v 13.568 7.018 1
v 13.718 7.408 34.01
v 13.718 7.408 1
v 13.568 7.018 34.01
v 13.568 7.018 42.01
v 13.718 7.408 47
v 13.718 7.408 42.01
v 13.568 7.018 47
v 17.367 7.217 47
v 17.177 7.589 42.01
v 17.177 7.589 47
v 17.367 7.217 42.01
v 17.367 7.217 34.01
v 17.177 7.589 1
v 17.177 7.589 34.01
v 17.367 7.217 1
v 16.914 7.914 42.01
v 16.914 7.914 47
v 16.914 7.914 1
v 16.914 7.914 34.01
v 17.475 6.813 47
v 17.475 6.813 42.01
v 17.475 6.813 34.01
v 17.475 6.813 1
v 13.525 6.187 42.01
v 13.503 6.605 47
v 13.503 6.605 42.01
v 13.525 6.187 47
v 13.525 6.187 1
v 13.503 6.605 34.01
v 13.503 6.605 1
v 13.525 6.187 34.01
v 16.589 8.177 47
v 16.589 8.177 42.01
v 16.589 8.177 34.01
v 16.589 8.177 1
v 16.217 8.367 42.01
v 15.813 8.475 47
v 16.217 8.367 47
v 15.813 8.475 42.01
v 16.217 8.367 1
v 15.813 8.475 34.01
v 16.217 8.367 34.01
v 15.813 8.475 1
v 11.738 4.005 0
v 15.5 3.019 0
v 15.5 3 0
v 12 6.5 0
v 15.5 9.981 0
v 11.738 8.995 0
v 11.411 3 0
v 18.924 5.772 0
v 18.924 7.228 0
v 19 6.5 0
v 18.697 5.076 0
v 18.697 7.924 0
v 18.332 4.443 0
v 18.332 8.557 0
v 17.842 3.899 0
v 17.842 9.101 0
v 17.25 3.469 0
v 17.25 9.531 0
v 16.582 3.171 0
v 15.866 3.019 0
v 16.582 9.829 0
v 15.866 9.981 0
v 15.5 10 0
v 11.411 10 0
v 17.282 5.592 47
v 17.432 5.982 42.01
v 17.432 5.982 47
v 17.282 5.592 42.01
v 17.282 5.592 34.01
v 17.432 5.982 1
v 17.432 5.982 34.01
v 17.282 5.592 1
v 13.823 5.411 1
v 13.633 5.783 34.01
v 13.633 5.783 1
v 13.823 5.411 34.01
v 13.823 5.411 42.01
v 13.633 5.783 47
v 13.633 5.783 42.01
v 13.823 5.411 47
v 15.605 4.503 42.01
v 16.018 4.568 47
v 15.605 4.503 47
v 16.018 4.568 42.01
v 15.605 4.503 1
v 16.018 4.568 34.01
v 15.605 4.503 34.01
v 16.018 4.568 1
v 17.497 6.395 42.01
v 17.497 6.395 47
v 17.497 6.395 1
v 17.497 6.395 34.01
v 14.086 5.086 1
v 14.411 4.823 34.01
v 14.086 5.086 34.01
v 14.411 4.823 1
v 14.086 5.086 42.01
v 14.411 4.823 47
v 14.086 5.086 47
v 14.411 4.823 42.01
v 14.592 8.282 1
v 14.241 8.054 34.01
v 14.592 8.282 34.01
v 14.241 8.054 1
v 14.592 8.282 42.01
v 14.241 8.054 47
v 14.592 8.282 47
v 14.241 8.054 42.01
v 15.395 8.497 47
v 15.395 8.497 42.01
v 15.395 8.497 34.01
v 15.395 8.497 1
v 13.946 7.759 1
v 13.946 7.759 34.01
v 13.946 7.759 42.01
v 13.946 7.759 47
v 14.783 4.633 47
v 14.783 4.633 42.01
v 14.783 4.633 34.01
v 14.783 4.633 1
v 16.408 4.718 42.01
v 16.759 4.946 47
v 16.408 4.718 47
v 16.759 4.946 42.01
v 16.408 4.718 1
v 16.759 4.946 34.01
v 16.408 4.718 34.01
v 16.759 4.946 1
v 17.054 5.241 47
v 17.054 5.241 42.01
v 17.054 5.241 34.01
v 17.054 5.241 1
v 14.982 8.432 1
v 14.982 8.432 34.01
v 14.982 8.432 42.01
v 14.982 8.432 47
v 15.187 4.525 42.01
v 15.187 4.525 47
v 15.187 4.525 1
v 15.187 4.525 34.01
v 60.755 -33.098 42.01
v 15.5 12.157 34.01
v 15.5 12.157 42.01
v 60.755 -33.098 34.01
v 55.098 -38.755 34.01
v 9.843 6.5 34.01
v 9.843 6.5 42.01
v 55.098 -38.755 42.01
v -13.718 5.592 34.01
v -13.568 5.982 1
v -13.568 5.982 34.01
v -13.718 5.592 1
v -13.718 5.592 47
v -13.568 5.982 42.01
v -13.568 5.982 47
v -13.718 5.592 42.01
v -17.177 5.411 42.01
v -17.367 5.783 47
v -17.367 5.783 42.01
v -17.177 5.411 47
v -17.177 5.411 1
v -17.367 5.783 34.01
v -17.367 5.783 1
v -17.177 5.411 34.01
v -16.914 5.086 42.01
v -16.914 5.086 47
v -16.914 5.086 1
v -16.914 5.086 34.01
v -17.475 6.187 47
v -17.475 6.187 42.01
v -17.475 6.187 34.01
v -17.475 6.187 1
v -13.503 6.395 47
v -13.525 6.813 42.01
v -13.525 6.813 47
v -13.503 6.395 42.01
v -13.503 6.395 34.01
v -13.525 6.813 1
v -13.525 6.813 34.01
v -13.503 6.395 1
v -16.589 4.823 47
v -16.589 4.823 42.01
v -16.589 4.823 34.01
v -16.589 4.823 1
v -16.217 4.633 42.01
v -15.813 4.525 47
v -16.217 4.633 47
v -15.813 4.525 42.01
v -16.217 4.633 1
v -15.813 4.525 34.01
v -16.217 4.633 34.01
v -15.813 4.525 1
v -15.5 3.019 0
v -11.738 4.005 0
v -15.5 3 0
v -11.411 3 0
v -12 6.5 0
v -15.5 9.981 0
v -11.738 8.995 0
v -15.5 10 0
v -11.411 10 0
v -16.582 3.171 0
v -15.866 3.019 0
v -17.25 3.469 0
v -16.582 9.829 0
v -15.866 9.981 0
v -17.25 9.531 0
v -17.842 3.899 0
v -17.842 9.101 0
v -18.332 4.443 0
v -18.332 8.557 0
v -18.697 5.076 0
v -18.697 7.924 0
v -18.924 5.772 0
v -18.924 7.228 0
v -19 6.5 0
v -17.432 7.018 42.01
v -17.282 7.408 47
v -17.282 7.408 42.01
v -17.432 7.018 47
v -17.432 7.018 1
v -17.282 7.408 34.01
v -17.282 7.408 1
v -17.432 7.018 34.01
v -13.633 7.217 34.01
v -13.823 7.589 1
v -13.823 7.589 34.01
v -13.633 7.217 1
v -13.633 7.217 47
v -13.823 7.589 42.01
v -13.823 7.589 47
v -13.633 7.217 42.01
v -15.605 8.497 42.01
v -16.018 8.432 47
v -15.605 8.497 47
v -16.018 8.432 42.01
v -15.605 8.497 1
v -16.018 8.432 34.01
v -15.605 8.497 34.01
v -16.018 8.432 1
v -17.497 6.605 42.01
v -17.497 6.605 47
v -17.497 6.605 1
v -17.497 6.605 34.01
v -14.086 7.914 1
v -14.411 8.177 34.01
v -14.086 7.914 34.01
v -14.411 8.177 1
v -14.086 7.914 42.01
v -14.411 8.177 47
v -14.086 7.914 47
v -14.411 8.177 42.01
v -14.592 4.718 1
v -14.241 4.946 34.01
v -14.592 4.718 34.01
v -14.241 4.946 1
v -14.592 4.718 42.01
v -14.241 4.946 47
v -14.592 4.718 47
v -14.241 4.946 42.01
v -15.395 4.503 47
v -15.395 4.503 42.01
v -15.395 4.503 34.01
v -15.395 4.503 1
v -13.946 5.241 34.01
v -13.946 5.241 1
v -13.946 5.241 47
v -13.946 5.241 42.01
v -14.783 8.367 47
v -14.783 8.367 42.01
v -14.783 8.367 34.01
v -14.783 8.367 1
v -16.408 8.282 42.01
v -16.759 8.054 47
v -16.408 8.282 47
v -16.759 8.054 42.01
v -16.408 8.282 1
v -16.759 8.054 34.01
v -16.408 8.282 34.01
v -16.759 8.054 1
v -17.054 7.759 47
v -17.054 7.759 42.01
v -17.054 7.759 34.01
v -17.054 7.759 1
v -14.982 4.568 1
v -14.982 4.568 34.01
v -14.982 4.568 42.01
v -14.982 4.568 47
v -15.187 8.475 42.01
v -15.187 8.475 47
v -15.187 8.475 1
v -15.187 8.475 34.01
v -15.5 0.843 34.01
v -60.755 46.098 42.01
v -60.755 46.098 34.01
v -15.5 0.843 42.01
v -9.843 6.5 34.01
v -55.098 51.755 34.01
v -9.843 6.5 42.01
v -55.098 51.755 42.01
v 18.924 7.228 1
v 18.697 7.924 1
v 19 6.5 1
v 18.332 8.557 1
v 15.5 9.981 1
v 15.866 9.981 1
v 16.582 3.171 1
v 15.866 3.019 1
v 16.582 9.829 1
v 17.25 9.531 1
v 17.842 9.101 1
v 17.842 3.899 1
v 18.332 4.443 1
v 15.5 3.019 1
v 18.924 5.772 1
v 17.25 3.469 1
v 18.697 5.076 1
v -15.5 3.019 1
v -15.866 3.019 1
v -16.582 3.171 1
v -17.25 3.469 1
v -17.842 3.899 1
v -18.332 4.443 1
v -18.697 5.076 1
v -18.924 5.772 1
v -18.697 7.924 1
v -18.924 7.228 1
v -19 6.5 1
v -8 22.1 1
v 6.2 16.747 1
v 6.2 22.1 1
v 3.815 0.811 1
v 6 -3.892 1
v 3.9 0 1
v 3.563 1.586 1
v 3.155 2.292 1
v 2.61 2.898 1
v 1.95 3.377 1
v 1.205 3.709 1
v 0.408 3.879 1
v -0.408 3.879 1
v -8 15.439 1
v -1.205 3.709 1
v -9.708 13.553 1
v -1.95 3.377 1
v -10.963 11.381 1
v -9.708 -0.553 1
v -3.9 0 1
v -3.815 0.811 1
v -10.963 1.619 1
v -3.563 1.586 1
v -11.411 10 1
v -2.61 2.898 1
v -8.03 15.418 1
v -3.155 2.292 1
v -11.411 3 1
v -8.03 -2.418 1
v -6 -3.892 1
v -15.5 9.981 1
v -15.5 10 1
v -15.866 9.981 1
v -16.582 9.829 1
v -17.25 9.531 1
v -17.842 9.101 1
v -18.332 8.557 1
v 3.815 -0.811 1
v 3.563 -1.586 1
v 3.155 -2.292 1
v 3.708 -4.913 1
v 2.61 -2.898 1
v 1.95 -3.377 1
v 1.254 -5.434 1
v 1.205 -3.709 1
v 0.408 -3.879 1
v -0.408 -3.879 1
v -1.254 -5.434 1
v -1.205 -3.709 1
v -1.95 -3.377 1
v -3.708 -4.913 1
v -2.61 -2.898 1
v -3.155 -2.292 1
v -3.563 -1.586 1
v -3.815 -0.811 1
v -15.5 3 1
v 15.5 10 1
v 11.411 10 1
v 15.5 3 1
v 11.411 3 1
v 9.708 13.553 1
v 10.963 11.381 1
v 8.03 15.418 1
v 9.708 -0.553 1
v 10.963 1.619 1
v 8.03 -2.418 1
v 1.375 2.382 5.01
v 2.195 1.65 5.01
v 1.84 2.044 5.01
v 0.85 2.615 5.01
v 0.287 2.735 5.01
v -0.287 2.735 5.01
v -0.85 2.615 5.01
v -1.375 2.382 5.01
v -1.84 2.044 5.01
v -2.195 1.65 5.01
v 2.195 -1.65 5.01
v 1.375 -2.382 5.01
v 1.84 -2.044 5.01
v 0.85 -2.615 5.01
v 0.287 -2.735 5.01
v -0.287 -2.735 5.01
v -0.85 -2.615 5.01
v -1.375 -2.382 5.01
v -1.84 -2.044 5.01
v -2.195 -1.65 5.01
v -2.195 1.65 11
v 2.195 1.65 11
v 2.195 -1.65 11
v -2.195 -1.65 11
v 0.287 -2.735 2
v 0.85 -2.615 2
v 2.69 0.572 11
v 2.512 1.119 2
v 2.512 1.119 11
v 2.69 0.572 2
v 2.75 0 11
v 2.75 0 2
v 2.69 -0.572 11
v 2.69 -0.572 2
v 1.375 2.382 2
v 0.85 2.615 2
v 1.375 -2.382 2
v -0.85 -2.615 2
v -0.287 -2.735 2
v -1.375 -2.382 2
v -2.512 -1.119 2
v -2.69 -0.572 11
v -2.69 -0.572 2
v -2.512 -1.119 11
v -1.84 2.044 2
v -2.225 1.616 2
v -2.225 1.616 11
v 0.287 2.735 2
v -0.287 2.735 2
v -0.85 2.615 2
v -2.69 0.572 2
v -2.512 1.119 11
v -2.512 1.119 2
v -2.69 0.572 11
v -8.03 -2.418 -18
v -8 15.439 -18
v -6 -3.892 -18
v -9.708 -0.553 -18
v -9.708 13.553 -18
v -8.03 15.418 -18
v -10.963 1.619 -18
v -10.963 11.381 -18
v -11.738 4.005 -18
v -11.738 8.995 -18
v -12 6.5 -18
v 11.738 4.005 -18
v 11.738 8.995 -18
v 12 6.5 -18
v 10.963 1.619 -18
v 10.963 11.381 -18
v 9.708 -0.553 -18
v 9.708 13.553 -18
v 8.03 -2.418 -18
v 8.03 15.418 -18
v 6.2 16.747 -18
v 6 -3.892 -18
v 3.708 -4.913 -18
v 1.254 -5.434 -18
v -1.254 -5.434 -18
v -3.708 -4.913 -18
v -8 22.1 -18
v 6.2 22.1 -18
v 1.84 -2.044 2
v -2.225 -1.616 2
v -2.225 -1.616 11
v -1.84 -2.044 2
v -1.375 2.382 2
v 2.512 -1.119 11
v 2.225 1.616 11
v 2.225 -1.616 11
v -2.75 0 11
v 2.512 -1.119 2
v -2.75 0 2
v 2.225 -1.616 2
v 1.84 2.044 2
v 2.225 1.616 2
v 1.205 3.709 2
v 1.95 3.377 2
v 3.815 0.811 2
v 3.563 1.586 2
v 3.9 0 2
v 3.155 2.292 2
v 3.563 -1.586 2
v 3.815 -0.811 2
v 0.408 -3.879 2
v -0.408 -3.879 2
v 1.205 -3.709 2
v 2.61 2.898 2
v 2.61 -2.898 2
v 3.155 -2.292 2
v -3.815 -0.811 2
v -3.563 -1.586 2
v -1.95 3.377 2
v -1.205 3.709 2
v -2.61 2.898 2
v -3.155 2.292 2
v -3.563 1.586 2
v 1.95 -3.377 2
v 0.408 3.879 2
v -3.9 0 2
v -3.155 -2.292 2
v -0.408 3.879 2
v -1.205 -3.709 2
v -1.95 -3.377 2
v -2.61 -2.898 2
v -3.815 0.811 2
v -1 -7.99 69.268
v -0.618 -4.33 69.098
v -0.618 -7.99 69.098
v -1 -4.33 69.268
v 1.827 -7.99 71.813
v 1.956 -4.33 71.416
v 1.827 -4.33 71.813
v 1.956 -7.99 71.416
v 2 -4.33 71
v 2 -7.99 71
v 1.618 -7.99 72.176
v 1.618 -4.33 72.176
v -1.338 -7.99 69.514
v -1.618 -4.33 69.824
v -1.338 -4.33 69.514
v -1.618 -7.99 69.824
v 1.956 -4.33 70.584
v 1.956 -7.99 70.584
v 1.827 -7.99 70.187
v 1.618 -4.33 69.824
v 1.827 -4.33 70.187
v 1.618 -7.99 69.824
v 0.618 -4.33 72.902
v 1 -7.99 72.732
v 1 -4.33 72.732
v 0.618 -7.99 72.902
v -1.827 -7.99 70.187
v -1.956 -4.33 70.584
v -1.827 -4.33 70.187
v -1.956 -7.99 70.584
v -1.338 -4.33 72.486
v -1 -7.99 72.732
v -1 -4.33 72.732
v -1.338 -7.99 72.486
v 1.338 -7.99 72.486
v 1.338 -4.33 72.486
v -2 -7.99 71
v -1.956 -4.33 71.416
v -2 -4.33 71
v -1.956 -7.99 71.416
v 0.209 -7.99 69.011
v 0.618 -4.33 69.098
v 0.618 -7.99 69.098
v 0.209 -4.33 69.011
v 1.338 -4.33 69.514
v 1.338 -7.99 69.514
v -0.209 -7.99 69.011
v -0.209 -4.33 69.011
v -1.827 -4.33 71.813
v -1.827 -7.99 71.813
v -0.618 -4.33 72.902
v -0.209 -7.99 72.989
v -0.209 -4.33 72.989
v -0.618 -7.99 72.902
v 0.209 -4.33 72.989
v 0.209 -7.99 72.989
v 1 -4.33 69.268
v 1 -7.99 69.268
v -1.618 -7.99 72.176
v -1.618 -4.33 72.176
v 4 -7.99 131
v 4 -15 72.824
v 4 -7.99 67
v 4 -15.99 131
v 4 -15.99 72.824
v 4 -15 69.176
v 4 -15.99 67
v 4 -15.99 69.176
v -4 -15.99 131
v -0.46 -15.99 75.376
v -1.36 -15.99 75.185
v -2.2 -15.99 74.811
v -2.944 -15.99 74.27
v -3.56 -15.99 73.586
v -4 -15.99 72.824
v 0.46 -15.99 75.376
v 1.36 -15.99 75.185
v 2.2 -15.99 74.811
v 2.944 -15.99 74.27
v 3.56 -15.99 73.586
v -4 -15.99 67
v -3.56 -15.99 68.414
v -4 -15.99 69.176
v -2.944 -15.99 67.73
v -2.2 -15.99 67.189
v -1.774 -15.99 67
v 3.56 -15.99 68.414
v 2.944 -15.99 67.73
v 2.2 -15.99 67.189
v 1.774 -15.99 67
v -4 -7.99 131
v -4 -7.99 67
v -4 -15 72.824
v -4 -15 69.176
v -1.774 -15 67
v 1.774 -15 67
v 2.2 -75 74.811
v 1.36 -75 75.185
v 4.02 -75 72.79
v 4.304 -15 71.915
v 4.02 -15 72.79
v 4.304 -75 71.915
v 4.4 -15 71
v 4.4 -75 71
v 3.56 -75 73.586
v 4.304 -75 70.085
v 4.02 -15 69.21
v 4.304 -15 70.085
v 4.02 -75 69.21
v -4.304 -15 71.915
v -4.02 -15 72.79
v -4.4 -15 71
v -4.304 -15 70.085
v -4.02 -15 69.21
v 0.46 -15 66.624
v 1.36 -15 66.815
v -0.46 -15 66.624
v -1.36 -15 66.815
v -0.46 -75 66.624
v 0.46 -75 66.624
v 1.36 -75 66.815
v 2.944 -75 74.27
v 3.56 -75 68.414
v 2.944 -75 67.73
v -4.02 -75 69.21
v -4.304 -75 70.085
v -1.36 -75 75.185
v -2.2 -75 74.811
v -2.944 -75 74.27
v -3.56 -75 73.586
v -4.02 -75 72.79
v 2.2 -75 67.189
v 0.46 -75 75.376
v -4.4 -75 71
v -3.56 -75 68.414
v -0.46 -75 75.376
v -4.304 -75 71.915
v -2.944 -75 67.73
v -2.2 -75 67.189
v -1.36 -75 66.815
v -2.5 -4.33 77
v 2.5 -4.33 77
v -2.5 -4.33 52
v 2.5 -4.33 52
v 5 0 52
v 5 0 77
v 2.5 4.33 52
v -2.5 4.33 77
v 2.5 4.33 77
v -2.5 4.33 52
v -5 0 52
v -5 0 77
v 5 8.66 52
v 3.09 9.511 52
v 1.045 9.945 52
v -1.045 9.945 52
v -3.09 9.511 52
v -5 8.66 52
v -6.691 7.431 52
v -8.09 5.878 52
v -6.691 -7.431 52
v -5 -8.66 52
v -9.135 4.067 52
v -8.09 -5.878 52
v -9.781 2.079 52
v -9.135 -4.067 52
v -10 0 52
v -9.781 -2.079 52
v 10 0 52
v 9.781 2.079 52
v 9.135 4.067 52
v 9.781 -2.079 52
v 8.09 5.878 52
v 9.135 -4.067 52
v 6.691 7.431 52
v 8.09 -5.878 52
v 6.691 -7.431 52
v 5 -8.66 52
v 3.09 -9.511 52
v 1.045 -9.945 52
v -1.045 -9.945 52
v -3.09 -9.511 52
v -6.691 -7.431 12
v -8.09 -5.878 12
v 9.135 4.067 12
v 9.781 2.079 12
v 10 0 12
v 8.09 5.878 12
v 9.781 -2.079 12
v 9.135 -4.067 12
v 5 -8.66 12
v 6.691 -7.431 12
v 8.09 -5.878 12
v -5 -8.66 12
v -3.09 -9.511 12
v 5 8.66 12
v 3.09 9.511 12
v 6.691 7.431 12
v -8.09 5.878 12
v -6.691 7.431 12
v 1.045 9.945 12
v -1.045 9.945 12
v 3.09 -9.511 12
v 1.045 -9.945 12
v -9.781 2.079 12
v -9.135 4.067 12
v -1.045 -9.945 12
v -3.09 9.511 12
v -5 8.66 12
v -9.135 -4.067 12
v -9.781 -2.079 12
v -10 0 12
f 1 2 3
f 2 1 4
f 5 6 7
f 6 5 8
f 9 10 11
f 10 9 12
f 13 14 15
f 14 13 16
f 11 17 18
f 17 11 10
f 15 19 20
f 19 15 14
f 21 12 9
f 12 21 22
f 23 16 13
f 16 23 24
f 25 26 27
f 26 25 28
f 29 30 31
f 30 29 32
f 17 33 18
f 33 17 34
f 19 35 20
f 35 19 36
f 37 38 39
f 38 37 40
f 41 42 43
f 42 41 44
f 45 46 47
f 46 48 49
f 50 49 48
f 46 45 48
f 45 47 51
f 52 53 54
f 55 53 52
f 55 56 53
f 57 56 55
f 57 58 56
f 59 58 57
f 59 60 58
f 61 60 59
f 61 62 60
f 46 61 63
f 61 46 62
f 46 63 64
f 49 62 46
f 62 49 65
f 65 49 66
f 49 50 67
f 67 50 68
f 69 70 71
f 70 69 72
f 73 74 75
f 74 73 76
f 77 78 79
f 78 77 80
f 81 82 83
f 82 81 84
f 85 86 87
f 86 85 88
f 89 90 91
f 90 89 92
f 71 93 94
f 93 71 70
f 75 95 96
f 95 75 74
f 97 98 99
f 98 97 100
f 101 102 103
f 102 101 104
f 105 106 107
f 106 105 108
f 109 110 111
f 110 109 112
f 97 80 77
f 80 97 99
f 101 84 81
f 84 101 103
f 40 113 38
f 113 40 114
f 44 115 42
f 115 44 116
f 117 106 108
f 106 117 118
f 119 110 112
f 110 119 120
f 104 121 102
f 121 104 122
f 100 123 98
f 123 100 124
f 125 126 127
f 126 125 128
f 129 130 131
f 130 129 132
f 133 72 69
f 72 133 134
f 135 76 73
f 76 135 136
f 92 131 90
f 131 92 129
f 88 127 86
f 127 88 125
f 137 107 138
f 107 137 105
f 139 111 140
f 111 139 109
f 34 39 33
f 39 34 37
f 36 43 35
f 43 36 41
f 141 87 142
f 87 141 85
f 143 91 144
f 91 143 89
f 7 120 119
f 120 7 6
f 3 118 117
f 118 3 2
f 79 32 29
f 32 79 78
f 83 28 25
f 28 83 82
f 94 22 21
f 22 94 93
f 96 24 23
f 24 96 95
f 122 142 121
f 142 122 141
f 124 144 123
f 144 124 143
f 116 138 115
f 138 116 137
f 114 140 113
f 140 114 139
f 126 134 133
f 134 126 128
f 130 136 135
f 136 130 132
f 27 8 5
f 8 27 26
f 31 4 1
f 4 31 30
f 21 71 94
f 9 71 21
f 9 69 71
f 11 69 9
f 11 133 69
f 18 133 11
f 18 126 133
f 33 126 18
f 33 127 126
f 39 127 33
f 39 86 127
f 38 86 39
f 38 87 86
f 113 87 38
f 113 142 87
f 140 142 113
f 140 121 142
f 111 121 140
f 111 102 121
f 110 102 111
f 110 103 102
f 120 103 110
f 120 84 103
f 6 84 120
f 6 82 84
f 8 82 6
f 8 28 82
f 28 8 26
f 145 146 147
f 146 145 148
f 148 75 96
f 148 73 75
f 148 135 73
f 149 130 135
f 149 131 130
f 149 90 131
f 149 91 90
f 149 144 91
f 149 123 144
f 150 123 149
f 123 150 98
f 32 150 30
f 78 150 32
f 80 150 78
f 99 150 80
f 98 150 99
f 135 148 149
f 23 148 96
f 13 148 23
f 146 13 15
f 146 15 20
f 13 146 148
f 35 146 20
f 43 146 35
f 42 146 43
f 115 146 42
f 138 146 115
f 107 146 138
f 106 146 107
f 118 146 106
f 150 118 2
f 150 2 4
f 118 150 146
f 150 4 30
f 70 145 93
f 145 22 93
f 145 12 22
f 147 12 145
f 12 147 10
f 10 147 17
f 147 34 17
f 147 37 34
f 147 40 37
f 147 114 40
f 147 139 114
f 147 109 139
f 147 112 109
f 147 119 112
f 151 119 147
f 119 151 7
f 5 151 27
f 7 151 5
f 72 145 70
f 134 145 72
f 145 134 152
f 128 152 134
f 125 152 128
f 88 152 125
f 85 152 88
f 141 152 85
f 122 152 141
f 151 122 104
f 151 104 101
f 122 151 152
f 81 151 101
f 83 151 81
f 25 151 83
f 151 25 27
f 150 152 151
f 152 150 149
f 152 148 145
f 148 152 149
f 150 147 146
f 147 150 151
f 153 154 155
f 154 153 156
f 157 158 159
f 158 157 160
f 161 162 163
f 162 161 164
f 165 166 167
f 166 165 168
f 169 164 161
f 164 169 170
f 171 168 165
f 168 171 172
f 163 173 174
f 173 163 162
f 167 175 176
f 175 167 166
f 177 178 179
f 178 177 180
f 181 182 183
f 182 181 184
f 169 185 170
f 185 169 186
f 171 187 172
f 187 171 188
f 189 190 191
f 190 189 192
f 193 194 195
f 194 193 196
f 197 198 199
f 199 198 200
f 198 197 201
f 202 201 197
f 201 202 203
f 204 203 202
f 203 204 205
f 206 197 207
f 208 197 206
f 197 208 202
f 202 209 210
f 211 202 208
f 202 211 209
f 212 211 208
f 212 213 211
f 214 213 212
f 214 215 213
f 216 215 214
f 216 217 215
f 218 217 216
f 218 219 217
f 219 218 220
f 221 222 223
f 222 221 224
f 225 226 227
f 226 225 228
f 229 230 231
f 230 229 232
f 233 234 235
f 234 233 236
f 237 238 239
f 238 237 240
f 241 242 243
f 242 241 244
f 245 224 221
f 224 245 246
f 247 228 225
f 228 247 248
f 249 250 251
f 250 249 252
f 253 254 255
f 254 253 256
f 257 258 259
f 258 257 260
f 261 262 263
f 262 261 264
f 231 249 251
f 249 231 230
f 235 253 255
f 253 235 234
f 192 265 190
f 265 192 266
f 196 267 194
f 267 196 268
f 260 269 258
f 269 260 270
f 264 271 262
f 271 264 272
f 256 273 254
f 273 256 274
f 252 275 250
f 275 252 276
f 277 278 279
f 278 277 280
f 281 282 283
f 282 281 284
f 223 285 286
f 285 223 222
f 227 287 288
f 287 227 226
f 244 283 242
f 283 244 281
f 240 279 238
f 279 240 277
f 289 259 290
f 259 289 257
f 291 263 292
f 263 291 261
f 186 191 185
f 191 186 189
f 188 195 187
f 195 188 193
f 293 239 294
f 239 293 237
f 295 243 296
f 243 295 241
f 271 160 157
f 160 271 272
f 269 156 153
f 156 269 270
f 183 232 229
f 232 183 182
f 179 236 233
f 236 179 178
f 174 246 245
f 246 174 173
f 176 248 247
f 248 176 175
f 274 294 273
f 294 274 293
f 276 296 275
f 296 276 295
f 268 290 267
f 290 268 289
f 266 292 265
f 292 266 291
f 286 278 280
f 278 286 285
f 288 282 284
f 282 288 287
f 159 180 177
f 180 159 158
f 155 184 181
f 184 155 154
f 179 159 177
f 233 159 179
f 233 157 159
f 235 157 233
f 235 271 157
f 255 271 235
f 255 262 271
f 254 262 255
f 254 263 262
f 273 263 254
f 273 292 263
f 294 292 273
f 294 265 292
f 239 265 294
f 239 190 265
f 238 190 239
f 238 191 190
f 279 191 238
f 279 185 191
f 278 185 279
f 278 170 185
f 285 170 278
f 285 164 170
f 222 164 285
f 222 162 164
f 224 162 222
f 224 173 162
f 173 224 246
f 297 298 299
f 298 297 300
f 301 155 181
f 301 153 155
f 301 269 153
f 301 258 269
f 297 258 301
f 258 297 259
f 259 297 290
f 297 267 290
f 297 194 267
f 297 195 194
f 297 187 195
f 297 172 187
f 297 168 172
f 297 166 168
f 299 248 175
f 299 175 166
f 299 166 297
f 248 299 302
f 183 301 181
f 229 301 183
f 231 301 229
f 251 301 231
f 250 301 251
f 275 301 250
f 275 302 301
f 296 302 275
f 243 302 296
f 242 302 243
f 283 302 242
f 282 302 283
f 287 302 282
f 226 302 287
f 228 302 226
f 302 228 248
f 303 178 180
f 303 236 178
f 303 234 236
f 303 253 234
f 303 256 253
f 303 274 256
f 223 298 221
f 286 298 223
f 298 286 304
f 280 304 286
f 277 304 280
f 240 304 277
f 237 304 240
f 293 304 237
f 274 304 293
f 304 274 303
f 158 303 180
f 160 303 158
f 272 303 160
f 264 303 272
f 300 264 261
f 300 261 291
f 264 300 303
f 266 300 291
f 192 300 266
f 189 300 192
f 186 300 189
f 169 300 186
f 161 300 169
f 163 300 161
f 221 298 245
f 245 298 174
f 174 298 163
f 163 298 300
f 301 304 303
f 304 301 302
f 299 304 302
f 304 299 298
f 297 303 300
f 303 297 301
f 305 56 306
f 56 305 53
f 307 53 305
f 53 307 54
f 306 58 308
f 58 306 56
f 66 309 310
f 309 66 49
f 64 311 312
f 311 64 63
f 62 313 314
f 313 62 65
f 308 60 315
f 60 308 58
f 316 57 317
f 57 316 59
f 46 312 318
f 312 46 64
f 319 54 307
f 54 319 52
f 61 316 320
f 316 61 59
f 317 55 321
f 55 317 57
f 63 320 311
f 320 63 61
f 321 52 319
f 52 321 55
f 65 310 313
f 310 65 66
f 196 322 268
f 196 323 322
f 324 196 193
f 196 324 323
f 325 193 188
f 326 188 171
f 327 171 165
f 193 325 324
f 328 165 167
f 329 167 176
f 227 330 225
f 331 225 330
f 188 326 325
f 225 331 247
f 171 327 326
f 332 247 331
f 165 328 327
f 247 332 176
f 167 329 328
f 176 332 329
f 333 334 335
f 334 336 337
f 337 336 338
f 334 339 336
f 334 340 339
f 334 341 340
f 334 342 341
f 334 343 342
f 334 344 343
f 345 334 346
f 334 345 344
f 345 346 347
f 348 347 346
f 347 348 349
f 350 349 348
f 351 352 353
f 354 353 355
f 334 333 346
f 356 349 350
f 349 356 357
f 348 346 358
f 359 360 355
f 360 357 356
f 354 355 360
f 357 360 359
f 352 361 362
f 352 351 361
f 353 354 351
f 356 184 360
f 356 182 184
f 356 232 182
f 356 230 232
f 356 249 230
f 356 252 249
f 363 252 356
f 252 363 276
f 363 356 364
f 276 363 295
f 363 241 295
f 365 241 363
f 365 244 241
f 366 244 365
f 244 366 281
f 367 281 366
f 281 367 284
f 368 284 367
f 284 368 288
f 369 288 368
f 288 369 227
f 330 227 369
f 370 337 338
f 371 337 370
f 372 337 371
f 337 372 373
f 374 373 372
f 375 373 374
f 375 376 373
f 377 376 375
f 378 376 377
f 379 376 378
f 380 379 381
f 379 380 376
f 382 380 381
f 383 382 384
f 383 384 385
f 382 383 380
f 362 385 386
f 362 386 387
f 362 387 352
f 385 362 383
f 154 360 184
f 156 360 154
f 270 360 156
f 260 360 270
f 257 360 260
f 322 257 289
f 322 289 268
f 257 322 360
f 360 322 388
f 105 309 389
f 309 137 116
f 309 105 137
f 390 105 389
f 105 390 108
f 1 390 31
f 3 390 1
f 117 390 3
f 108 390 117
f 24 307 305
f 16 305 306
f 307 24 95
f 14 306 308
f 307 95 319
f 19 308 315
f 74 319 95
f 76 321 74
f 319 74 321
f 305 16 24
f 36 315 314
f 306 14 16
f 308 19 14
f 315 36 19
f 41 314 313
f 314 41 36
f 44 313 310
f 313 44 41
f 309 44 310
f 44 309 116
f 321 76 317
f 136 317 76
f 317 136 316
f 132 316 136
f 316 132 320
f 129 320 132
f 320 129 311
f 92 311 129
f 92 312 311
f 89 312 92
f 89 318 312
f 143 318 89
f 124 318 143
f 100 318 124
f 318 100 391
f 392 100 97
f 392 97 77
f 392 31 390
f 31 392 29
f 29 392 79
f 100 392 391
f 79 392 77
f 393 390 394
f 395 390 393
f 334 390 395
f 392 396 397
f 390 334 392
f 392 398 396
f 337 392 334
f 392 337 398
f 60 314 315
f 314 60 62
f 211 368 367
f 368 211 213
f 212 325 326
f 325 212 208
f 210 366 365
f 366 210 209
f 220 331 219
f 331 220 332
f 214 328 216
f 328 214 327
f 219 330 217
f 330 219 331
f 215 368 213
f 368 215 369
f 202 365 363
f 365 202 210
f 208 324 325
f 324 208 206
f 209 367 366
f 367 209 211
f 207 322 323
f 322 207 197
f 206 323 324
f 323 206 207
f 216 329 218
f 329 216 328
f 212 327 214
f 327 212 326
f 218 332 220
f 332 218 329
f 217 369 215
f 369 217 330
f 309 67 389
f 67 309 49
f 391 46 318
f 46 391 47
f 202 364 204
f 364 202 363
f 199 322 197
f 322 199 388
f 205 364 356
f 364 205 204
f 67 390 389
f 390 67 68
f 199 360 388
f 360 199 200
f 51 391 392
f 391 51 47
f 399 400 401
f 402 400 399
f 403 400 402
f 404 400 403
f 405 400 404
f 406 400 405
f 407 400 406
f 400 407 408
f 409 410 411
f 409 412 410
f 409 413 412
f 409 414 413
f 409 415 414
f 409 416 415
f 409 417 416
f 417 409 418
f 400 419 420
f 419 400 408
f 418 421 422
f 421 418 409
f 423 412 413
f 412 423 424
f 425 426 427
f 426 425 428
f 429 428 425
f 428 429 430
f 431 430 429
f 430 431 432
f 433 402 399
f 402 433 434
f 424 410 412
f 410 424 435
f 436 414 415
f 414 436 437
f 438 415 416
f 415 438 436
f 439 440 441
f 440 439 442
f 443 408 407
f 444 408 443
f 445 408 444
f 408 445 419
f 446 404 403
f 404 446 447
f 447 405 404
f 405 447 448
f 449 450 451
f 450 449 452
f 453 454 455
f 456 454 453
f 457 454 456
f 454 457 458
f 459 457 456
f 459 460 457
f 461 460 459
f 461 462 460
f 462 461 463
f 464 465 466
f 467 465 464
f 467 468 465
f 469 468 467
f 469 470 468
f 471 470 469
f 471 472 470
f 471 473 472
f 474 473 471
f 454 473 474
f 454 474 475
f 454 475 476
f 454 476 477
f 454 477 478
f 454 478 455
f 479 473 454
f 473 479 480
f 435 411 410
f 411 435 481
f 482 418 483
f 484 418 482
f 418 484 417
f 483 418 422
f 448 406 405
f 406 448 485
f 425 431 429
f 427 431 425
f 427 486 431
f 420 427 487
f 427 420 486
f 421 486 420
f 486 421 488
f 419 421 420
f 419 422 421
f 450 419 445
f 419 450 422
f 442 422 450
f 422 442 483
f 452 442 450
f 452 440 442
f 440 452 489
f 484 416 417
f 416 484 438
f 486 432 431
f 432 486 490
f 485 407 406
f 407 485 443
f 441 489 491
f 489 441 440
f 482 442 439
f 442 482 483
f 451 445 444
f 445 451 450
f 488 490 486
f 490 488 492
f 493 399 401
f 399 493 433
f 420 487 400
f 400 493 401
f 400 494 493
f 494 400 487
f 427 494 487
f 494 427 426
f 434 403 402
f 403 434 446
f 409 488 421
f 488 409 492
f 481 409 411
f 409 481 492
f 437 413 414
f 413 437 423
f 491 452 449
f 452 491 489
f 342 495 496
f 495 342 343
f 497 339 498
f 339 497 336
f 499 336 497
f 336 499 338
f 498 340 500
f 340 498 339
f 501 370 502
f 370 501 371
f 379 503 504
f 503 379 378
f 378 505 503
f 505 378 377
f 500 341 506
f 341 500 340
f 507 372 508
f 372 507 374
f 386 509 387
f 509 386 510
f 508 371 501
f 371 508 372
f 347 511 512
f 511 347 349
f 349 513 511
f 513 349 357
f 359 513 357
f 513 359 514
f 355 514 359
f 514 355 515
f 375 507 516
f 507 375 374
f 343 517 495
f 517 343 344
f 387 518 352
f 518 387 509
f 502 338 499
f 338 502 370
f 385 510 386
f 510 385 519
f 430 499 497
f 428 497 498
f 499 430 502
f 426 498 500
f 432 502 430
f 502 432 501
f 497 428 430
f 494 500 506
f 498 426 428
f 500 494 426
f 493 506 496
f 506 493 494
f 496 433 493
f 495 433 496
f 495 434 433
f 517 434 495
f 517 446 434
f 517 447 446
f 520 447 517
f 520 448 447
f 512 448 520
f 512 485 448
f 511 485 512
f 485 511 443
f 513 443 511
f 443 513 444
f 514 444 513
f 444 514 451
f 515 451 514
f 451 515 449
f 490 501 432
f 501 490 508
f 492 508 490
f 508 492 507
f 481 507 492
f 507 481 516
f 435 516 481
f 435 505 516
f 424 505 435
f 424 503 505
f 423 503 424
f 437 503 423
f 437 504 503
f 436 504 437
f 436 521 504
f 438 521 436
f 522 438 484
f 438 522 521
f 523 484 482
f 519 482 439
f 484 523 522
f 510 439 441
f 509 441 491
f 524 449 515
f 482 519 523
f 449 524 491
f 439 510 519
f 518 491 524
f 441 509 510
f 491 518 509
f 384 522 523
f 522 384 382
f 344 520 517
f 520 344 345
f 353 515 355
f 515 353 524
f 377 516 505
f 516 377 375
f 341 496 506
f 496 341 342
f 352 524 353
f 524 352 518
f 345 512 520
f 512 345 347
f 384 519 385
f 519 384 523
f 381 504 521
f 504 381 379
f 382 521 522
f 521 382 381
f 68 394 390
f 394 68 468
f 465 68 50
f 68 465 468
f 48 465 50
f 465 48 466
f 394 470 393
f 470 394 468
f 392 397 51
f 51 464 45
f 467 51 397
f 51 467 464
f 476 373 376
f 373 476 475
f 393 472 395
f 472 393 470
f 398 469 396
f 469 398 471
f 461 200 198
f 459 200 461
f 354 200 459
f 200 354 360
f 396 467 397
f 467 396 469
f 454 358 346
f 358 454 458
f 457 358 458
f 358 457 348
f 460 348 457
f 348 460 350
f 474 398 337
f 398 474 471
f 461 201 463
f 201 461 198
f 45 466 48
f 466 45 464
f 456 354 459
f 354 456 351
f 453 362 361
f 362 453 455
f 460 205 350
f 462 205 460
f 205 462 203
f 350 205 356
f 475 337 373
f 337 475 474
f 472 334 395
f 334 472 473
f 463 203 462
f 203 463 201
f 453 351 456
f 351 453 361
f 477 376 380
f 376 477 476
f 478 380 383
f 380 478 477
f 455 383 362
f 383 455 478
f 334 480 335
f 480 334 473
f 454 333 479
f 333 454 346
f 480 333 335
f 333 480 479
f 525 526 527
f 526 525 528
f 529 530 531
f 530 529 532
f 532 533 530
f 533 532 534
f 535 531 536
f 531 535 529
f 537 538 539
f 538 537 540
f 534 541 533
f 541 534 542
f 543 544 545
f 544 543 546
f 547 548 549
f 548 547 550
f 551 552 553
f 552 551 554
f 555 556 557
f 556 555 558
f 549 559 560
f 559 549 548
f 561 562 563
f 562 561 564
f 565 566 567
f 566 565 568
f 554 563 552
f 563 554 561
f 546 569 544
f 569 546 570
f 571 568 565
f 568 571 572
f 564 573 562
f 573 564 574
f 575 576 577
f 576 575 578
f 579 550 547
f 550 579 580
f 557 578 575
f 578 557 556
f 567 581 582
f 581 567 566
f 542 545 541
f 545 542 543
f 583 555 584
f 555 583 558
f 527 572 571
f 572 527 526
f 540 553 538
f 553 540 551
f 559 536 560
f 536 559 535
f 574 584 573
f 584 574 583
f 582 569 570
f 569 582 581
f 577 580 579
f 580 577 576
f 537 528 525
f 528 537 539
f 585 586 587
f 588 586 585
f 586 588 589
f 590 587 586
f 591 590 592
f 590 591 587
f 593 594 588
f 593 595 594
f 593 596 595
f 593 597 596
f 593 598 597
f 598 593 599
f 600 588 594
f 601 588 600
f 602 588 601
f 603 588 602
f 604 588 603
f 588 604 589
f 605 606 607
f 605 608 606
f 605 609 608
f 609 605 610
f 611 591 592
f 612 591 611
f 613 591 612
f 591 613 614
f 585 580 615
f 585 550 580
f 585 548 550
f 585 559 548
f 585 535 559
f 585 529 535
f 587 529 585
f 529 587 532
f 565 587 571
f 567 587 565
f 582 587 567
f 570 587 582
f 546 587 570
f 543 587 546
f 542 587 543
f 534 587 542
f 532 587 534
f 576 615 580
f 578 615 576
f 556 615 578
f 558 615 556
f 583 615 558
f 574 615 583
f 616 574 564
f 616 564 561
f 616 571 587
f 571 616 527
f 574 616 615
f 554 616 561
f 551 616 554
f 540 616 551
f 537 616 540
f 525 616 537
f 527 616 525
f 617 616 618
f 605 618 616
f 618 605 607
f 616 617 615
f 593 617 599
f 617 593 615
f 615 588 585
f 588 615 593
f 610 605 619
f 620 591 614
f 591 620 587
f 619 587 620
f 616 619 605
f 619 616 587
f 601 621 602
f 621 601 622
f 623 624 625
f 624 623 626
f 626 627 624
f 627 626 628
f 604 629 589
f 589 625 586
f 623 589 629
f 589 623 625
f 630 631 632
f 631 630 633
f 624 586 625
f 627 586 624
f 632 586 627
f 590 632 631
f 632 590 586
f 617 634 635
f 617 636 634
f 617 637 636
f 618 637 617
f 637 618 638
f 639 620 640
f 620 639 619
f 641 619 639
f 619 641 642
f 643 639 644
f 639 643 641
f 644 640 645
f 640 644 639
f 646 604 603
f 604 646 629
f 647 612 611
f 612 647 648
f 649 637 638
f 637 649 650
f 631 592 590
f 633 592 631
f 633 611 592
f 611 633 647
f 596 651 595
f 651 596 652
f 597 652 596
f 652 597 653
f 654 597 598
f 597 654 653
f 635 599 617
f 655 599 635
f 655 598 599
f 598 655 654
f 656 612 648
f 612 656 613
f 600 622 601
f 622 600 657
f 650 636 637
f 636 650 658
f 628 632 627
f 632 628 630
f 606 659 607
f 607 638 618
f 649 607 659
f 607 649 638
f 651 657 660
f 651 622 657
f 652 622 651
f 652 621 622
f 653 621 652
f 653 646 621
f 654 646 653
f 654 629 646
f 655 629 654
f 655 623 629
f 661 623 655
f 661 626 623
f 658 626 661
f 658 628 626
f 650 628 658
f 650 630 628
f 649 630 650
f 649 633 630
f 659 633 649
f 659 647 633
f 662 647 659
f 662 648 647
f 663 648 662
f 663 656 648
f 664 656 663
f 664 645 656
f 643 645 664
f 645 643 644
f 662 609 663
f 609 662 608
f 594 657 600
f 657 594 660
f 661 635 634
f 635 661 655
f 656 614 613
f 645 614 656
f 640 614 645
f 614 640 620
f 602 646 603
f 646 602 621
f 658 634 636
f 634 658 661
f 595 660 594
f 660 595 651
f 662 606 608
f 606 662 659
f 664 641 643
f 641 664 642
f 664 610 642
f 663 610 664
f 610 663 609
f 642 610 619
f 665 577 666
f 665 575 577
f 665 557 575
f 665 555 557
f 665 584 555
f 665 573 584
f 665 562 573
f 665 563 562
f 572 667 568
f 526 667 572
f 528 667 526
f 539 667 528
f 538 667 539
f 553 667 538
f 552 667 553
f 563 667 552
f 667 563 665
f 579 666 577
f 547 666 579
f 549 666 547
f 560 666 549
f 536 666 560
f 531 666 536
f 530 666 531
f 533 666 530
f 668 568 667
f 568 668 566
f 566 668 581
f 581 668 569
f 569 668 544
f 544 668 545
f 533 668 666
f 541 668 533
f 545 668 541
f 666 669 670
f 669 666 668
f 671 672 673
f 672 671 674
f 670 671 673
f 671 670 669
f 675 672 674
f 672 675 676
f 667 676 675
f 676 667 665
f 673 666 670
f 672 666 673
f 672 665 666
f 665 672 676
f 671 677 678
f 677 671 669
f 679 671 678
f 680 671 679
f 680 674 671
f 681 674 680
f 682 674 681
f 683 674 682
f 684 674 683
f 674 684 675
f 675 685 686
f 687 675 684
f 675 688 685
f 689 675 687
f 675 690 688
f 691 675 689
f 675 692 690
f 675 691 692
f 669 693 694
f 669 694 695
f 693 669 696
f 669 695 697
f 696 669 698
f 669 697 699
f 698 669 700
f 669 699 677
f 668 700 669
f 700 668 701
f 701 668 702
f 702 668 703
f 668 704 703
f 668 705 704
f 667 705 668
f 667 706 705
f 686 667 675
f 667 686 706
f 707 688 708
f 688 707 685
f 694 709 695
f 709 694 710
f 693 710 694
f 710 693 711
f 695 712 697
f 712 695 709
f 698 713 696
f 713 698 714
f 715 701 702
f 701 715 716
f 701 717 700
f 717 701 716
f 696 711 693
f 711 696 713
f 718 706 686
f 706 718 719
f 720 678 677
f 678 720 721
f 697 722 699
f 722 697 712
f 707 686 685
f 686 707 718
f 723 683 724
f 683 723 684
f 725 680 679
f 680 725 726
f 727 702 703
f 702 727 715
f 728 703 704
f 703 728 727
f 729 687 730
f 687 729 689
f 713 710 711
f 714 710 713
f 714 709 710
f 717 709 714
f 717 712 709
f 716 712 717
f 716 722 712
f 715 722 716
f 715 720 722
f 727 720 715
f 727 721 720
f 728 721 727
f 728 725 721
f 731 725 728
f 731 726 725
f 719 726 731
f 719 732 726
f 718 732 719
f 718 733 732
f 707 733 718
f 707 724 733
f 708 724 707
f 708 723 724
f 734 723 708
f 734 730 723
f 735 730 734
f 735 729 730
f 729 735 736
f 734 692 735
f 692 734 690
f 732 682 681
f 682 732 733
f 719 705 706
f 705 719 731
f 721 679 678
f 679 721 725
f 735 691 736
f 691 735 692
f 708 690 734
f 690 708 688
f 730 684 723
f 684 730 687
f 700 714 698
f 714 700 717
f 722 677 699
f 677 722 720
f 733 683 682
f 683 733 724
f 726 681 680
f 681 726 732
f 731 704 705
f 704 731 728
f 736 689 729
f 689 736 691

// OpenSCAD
module coupler(){
	difference(){
		translate([0,0,10])
		cylinder(h=10,r=6,center=true,$fn=res); // coupler space
		translate([0,0,16])
		cylinder(h=10,r=4.25,center=true,$fn=6); // coupler space
		stepper_mounted(screw=0);
	}
}

module couplerKM200(){
	difference(){
		translate([0,0,13])
		cylinder(h=15,r=10,center=true,$fn=res); // coupler space
		translate([0,0,18])
		cylinder(h=15,r=15/2,center=true,$fn=res); // coupler space
		stepper_mounted(screw=0);
	}
}

module stepper_mounted(n_l=45,n_d=5,n_rot1=45,n_rot2=-135,n_w=7.2,n_z=2.5,screw_w=4,screw=2,res=30,scaling=1){
    module 24byj48() {
        scaling=1.1;//scaling for 3d print fit
        //body
        cylinder(h=19,d=24,center=false,$fn=res);
        translate([-8,0,0])
        cube([14.2,15.6,19]);
    
        //mount tabs
        difference(){
            union(){
                translate([15.5,0,18])
                cylinder(h=1,d=7,center=false,$fn=res);
                translate([-15.5,0,18])
                cylinder(h=1,d=7,center=false,$fn=res);
                translate([0,0,18.5])
                cube([31,7,1],center=true);
            }
            translate([15.5,0,15.5])
            cylinder(h=2,d=4.2,center=false,$fn=res);
            translate([-15.5,0,15.5])
            cylinder(h=2,d=4.2,center=false,$fn=res);
        }
        
        
        //shaft
        translate([0,-6.5,0]){
            cylinder(h=20,d=7.8,center=false,$fn=res);
            difference(){
                cylinder(h=29,d=5*scaling,center=false,$fn=res);
                translate([0,0,26.01])
                difference(){
                    cube([15,10,6],center=true);
                    cube([10,3*scaling,6],center=true);
                }
            }
        }
    }
    
    module screw_nut_uncut(nut_depth, nut_length,nut_thick) {
        cylinder(h=nut_length,d=screw_w,center=false,$fn=res);
        translate([0,n_w/2,nut_depth+nut_thick/2-0.01])
        cube(size=[n_w,n_w*2,nut_thick], center=true);
    }
    
    module micrometer_screw(){
        translate([0,0,16])
        cylinder(h=10,d=12,center=true,$fn=res);
        translate([0,0,14+6+10])
        cylinder(h=28,d=6,center=true,$fn=res);
        translate([0,0,40])
        cylinder(h=10,d=8.0,center=true,$fn=res);
        translate([0,0,44.5])
        cylinder(h=1,d=10.2,center=true,$fn=res);
        translate([0,0,20])
        cylinder(h=30,d=18,center=true,$fn=res); // coupler space
    }
    
    module m4_screw(){
        translate([0,0,20])
        cylinder(h=20,d=6,center=true,$fn=res); // coupler space
        translate([0,0,28])
        rotate([0,0,45])
        cube([7.2,7.2,4],center=true);
    }
    
    //mounting screws
    
    translate([15.5,6.5,n_l])
    rotate([180,0,n_rot1])
    screw_nut_uncut(n_d,n_l,n_z);
    translate([-15.5,6.5,n_l])
    rotate([180,0,n_rot2])
    screw_nut_uncut(n_d,n_l,n_z);
    
    translate([0,6.5,-18])
    24byj48();
    
    if(screw==1){
        micrometer_screw();
    }
    if(screw==2){
        m4_screw();
    }
}

module stepper_mounted2(n_l=47,n_d=5,n_rot1=45,n_rot2=-135,n_w=8,n_z=8,screw_w=4,screw=2,res=30,scaling=1,n_rot3=0,s_rot1=0){
    module 24byj48() {
        scaling=1.1;//scaling for 3d print fit
        //body
        cylinder(h=19,d=24,center=false,$fn=res);
        translate([-8,0,0])
        cube([14.2,15.6,19]);
    
        //mount tabs
        difference(){
            union(){
                translate([15.5,0,18])
                cylinder(h=1,d=7,center=false,$fn=res);
                translate([-15.5,0,18])
                cylinder(h=1,d=7,center=false,$fn=res);
                translate([0,0,18.5])
                cube([31,7,1],center=true);
            }
            translate([15.5,0,15.5])
            cylinder(h=2,d=4.2,center=false,$fn=res);
            translate([-15.5,0,15.5])
            cylinder(h=2,d=4.2,center=false,$fn=res);
        }
        
        
        //shaft
        translate([0,-6.5,0]){
            cylinder(h=20,d=7.8,center=false,$fn=res);
            difference(){
                cylinder(h=29,d=5*scaling,center=false,$fn=res);
                translate([0,0,26.01])
                difference(){
                    cube([15,10,6],center=true);
                    cube([10,3*scaling,6],center=true);
                }
            }
        }
    }
    
    module screw_nut_uncut(nut_depth, nut_length,nut_thick) {
        cylinder(h=nut_length,d=screw_w,center=false,$fn=res);
        translate([0,n_w*3.5,nut_depth+nut_thick/2-0.01])
        cube(size=[n_w,n_w*8,nut_thick], center=true);
    }
    
    /*module micrometer_screw(){
        translate([0,0,16])
        cylinder(h=10,d=12,center=true,$fn=res);
        translate([0,0,14+6+10])
        cylinder(h=28,d=6,center=true,$fn=res);
        translate([0,0,40])
        cylinder(h=10,d=8.0,center=true,$fn=res);
        difference(){
            translate([0,0,44.5])
            cylinder(h=1,d=10.2,center=true,$fn=res);
            translate([4,-5,42])
            cube(size=[10,10,10]);
        }
        translate([0,0,10])
        cylinder(h=50,d=20,center=true,$fn=res); // coupler space
        translate([0,0,40])
        rotate([90,s_rot1,n_rot3])
        union(){
            screw_nut_uncut(8,n_l,n_z);
            translate([0,0,15]) cylinder(h=60,d=screw_w*2.2,center=false,$fn=res);
        }
    }*/
        //m5 hex nut
     module micrometer_screw2(){
        
        //translate([0,0,16])
        //cylinder(h=10,d=22,center=true,$fn=res);
        
        //translate([0,0,14+6+10])
        //cylinder(h=28,d=6,center=true,$fn=res);
        // screw body
        translate([0,0,32.5])
        rotate([0,s_rot1,n_rot3])
        cylinder(h=25,d=10,center=true,$fn=6); //11.6mm for M6
        //front flange
        /*difference(){
            translate([0,0,44.5])
            cylinder(h=1,d=10.2,center=true,$fn=res);
            translate([4,-5,42])
            cube(size=[10,10,10]);
        }*/
        //coupler space
        translate([0,0,0])
        cylinder(h=40,d=20,center=true,$fn=res);
        
        translate([0,0,40-1])
        rotate([90,s_rot1,n_rot3])
        union(){
            screw_nut_uncut(8,n_l,n_z);
            translate([0,0,15]) cylinder(h=60,d=screw_w*2.2,center=false,$fn=res);
        }
    }
    
    module m4_screw(){
        translate([0,0,30])
        cylinder(h=40,d=5,center=true,$fn=res); // coupler space
        translate([0,-7.6*1,45])
        rotate([0,0,0])
        cube([7.6,7.6*3,2.5],center=true);
    }
    
    //mounting screws
    
    translate([15.5,6.5,n_l])
    rotate([180,0,n_rot1])
    screw_nut_uncut(n_d,n_l,n_z);
    translate([-15.5,6.5,n_l])
    rotate([180,0,n_rot2])
    screw_nut_uncut(n_d,n_l,n_z);
    

    
    translate([0,6.5,-18])
    24byj48();
    
    if(screw==1){
        translate([0,0,32])
        micrometer_screw2();
            //spring space
        /*translate([15.5,6.5,18])
        cylinder(h=34,d=7,center=true,$fn=res);
        translate([-15.5,6.5,18])
        cylinder(h=34,d=7,center=true,$fn=res);*/
    }
    if(screw==2){
        m4_screw();
    }
}
stepper_mounted2(screw=1);
//coupler();
